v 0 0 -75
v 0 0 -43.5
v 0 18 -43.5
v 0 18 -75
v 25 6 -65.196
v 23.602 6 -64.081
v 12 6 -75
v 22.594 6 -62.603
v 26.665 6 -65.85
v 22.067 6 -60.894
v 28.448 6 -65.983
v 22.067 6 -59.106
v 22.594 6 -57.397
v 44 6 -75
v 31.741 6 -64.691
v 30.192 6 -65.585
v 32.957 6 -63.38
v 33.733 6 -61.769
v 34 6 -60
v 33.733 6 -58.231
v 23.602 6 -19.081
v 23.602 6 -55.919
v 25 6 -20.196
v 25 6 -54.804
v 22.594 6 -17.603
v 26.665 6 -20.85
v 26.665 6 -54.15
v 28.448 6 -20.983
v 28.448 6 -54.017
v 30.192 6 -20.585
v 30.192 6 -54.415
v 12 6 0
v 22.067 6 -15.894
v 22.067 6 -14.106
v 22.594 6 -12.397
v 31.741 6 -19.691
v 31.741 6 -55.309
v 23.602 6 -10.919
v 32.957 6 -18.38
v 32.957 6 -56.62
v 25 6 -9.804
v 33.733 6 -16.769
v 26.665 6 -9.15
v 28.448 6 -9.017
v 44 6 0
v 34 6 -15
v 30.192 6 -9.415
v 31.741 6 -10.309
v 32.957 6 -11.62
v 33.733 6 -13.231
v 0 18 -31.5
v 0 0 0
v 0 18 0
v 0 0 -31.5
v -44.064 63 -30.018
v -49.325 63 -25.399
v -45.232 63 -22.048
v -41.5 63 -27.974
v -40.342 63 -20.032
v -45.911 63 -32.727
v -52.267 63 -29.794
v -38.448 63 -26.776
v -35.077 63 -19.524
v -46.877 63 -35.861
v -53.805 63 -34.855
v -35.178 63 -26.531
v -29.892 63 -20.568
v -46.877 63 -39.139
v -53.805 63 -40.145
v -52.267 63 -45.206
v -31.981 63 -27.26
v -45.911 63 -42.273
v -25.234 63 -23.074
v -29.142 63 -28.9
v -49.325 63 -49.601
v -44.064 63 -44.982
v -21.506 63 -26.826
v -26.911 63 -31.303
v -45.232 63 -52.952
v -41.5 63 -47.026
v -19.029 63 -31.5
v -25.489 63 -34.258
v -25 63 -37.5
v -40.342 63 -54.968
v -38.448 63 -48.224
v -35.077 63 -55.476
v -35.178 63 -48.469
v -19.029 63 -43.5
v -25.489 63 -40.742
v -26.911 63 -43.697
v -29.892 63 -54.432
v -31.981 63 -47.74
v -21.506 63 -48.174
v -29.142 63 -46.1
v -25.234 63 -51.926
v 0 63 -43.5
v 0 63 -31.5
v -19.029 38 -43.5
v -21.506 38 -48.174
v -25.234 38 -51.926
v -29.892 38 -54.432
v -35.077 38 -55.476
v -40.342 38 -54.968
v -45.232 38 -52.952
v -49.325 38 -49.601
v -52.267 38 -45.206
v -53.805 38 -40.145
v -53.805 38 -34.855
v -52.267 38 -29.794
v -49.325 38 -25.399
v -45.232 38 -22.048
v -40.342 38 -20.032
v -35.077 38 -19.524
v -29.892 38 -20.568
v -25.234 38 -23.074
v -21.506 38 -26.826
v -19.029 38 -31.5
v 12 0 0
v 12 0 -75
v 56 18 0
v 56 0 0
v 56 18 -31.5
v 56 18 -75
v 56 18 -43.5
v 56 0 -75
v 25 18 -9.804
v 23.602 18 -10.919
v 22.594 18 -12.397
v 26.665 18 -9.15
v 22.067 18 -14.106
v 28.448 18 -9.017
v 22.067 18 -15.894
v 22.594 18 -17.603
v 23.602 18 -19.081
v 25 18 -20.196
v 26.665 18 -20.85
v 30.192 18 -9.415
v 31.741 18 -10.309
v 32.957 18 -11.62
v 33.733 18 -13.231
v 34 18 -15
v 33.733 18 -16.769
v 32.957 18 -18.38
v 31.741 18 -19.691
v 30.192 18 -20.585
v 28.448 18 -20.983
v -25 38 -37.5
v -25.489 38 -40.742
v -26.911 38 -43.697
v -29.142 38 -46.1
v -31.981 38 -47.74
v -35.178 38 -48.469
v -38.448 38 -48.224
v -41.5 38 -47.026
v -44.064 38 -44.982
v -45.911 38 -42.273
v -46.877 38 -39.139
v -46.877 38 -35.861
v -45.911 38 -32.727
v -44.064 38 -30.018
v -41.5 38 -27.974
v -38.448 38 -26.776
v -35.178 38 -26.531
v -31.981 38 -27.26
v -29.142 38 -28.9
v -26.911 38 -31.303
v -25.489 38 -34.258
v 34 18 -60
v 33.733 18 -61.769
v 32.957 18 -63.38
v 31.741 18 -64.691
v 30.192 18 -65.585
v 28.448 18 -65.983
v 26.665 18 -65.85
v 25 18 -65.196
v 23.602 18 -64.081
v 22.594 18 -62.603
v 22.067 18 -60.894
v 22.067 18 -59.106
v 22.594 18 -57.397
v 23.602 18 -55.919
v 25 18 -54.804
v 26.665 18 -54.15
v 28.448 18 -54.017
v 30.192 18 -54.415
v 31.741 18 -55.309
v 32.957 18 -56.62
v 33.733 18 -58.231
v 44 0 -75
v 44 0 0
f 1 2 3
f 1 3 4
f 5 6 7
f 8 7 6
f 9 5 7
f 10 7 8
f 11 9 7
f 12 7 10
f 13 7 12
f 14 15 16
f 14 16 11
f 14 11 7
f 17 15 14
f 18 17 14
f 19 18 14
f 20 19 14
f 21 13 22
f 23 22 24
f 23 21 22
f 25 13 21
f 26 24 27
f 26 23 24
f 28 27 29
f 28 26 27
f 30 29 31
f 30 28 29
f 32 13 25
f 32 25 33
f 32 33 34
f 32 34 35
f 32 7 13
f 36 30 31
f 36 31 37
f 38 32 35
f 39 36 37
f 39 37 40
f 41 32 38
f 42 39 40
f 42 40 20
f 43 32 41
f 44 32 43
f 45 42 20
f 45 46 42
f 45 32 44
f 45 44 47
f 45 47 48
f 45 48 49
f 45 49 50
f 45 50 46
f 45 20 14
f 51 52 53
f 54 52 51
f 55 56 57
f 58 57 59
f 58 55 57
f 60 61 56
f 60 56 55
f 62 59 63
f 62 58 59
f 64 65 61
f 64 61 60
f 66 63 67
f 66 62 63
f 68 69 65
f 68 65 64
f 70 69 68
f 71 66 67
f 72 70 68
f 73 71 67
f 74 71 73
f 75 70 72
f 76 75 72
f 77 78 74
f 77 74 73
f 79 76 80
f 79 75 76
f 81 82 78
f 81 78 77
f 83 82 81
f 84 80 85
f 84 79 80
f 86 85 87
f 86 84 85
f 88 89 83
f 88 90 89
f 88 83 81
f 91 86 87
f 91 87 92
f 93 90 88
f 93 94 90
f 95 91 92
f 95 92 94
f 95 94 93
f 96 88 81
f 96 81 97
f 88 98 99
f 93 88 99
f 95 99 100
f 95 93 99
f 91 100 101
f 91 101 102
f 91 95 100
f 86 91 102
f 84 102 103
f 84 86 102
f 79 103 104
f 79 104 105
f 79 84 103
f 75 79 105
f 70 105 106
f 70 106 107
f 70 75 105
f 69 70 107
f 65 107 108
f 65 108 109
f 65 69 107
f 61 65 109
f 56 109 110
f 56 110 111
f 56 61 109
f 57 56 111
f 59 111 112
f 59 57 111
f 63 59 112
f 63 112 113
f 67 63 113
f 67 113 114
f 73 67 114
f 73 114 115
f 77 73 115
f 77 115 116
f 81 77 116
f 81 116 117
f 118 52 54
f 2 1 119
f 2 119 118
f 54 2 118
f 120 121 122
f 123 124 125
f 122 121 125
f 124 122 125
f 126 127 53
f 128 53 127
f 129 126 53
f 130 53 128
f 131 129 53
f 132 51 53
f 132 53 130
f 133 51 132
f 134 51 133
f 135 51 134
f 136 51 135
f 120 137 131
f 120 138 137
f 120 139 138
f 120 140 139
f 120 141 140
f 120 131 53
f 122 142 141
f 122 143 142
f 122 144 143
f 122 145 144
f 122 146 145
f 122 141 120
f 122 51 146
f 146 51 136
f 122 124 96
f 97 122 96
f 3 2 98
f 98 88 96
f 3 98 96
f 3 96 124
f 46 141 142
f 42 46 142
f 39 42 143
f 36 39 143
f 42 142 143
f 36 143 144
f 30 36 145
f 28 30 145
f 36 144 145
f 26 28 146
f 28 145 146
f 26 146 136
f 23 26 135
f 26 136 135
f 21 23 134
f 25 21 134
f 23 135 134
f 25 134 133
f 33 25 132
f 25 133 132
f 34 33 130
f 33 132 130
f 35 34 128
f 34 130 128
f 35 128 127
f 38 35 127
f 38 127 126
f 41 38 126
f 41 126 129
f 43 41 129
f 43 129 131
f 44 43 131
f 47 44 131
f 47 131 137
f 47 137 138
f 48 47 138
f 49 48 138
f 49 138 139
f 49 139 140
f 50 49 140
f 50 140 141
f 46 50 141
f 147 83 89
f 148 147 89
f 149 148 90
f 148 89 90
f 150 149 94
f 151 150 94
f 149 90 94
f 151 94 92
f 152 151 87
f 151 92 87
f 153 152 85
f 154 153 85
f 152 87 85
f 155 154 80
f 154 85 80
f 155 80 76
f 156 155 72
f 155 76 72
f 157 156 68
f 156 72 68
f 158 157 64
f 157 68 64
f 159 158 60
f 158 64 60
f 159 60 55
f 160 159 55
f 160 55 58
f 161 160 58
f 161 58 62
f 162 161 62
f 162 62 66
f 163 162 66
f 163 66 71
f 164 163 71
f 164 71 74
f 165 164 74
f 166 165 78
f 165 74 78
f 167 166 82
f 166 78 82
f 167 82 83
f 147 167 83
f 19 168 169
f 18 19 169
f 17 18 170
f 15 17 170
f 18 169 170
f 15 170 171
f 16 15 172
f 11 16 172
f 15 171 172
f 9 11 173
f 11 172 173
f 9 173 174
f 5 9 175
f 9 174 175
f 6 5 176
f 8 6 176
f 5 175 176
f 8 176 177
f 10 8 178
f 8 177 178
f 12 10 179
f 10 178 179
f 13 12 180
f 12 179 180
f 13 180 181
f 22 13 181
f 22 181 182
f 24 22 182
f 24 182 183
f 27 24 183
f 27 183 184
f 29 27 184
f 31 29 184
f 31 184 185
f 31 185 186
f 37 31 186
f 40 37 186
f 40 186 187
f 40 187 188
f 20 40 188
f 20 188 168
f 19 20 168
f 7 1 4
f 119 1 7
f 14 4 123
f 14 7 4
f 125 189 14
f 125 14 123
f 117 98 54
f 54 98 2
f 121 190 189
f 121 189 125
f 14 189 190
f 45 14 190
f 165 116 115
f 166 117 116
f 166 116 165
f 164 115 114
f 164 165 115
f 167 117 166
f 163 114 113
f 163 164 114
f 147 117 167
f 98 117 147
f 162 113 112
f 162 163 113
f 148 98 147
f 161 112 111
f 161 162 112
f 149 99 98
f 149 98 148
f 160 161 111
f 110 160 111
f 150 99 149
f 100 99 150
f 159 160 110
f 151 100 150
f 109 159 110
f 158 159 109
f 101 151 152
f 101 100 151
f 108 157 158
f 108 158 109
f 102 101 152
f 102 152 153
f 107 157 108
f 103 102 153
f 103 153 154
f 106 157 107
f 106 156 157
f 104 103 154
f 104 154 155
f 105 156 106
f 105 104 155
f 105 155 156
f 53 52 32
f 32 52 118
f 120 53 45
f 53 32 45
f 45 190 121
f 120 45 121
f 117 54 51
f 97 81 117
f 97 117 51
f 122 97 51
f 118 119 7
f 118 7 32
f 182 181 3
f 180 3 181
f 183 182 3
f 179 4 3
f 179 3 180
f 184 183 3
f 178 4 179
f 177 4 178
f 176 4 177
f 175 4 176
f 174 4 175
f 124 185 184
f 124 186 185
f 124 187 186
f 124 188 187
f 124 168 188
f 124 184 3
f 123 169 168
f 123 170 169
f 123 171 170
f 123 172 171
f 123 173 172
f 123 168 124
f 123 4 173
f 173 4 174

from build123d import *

# Parameters (mm, degrees)
SKETCH2_W            = 56
SKETCH2_H            = 75
BOSS_EXTRUDE1_DEPTH  = 18
SKETCH3_W            = 32
SKETCH3_H            = 75
CUT_EXTRUDE1_DEPTH   = 6
SKETCH6_R            = 6
CUT_EXTRUDE2_DEPTH   = 47
SKETCH7_W            = 56
SKETCH7_H            = 12
BOSS_EXTRUDE2_DEPTH  = 45
CUT_EXTRUDE3_DEPTH   = 45
SKETCH9_W            = 36
SKETCH9_H            = 25
BOSS_EXTRUDE5_DEPTH  = 12
SKETCH10_R           = 18
BOSS_EXTRUDE9_DEPTH  = 25
SKETCH11_R           = 11
CUT_EXTRUDE4_DEPTH   = 25
BOSS_EXTRUDE10_DEPTH = 12


with BuildPart() as part:
    # Sketch2 → Boss-Extrude1 (new body)
    with BuildSketch(Plane(origin=(0, 0, 0), x_dir=(1, 0, 0), z_dir=(0, 1, 0))):
        with Locations((28, 37.5)):
            Rectangle(SKETCH2_W, SKETCH2_H)
    extrude(amount=BOSS_EXTRUDE1_DEPTH)

    # Sketch3 → Cut-Extrude1 (cut)
    with BuildSketch(Plane.XZ):
        with Locations((28, -37.5)):
            Rectangle(SKETCH3_W, SKETCH3_H)
    extrude(amount=-CUT_EXTRUDE1_DEPTH, mode=Mode.SUBTRACT)

    # Sketch6 → Cut-Extrude2 (cut)
    with BuildSketch(Plane(origin=(0, 18, 0), x_dir=(1, 0, 0), z_dir=(0, 1, 0))):
        with Locations((28, 15)):
            Circle(SKETCH6_R)
        with Locations((28, 60)):
            Circle(SKETCH6_R)
    extrude(amount=-CUT_EXTRUDE2_DEPTH, mode=Mode.SUBTRACT)

    # Sketch7 → Boss-Extrude2 (add)
    with BuildSketch(Plane(origin=(0, 18, 0), x_dir=(1, 0, 0), z_dir=(0, 1, 0))):
        with Locations((28, 37.5)):
            Rectangle(SKETCH7_W, SKETCH7_H)
    extrude(amount=BOSS_EXTRUDE2_DEPTH)

    # Sketch8 → Cut-Extrude3 (cut)
    with BuildSketch(Plane(origin=(0, 0, -43.5), x_dir=(-1, 0, 0), z_dir=(0, 0, -1))):
        Polygon((-56, 18), (0, 63), (-56, 63), align=None)
    extrude(amount=-CUT_EXTRUDE3_DEPTH, mode=Mode.SUBTRACT)

    # Sketch9 → Boss-Extrude5 (add)
    with BuildSketch(Plane(origin=(0, 0, -43.5), x_dir=(-1, 0, 0), z_dir=(0, 0, -1))):
        with Locations((18, 50.5)):
            Rectangle(SKETCH9_W, SKETCH9_H)
    extrude(amount=-BOSS_EXTRUDE5_DEPTH)

    # Sketch10 → Boss-Extrude9 (add)
    with BuildSketch(Plane(origin=(0, 63, 0), x_dir=(1, 0, 0), z_dir=(0, 1, 0))):
        with Locations((-36, 37.5)):
            Circle(SKETCH10_R)
    extrude(amount=-BOSS_EXTRUDE9_DEPTH)

    # Sketch11 → Cut-Extrude4 (cut)
    with BuildSketch(Plane(origin=(0, 63, 0), x_dir=(1, 0, 0), z_dir=(0, 1, 0))):
        with Locations((-36, 37.5)):
            Circle(SKETCH11_R)
    extrude(amount=-CUT_EXTRUDE4_DEPTH, mode=Mode.SUBTRACT)

    # Sketch12 → Boss-Extrude10 (add)
    with BuildSketch(Plane(origin=(0, 0, -43.5), x_dir=(-1, 0, 0), z_dir=(0, 0, -1))):
        Polygon((19.029437252, 38), (0, 0), (0, 38), align=None)
    extrude(amount=-BOSS_EXTRUDE10_DEPTH)


solid = part.part
